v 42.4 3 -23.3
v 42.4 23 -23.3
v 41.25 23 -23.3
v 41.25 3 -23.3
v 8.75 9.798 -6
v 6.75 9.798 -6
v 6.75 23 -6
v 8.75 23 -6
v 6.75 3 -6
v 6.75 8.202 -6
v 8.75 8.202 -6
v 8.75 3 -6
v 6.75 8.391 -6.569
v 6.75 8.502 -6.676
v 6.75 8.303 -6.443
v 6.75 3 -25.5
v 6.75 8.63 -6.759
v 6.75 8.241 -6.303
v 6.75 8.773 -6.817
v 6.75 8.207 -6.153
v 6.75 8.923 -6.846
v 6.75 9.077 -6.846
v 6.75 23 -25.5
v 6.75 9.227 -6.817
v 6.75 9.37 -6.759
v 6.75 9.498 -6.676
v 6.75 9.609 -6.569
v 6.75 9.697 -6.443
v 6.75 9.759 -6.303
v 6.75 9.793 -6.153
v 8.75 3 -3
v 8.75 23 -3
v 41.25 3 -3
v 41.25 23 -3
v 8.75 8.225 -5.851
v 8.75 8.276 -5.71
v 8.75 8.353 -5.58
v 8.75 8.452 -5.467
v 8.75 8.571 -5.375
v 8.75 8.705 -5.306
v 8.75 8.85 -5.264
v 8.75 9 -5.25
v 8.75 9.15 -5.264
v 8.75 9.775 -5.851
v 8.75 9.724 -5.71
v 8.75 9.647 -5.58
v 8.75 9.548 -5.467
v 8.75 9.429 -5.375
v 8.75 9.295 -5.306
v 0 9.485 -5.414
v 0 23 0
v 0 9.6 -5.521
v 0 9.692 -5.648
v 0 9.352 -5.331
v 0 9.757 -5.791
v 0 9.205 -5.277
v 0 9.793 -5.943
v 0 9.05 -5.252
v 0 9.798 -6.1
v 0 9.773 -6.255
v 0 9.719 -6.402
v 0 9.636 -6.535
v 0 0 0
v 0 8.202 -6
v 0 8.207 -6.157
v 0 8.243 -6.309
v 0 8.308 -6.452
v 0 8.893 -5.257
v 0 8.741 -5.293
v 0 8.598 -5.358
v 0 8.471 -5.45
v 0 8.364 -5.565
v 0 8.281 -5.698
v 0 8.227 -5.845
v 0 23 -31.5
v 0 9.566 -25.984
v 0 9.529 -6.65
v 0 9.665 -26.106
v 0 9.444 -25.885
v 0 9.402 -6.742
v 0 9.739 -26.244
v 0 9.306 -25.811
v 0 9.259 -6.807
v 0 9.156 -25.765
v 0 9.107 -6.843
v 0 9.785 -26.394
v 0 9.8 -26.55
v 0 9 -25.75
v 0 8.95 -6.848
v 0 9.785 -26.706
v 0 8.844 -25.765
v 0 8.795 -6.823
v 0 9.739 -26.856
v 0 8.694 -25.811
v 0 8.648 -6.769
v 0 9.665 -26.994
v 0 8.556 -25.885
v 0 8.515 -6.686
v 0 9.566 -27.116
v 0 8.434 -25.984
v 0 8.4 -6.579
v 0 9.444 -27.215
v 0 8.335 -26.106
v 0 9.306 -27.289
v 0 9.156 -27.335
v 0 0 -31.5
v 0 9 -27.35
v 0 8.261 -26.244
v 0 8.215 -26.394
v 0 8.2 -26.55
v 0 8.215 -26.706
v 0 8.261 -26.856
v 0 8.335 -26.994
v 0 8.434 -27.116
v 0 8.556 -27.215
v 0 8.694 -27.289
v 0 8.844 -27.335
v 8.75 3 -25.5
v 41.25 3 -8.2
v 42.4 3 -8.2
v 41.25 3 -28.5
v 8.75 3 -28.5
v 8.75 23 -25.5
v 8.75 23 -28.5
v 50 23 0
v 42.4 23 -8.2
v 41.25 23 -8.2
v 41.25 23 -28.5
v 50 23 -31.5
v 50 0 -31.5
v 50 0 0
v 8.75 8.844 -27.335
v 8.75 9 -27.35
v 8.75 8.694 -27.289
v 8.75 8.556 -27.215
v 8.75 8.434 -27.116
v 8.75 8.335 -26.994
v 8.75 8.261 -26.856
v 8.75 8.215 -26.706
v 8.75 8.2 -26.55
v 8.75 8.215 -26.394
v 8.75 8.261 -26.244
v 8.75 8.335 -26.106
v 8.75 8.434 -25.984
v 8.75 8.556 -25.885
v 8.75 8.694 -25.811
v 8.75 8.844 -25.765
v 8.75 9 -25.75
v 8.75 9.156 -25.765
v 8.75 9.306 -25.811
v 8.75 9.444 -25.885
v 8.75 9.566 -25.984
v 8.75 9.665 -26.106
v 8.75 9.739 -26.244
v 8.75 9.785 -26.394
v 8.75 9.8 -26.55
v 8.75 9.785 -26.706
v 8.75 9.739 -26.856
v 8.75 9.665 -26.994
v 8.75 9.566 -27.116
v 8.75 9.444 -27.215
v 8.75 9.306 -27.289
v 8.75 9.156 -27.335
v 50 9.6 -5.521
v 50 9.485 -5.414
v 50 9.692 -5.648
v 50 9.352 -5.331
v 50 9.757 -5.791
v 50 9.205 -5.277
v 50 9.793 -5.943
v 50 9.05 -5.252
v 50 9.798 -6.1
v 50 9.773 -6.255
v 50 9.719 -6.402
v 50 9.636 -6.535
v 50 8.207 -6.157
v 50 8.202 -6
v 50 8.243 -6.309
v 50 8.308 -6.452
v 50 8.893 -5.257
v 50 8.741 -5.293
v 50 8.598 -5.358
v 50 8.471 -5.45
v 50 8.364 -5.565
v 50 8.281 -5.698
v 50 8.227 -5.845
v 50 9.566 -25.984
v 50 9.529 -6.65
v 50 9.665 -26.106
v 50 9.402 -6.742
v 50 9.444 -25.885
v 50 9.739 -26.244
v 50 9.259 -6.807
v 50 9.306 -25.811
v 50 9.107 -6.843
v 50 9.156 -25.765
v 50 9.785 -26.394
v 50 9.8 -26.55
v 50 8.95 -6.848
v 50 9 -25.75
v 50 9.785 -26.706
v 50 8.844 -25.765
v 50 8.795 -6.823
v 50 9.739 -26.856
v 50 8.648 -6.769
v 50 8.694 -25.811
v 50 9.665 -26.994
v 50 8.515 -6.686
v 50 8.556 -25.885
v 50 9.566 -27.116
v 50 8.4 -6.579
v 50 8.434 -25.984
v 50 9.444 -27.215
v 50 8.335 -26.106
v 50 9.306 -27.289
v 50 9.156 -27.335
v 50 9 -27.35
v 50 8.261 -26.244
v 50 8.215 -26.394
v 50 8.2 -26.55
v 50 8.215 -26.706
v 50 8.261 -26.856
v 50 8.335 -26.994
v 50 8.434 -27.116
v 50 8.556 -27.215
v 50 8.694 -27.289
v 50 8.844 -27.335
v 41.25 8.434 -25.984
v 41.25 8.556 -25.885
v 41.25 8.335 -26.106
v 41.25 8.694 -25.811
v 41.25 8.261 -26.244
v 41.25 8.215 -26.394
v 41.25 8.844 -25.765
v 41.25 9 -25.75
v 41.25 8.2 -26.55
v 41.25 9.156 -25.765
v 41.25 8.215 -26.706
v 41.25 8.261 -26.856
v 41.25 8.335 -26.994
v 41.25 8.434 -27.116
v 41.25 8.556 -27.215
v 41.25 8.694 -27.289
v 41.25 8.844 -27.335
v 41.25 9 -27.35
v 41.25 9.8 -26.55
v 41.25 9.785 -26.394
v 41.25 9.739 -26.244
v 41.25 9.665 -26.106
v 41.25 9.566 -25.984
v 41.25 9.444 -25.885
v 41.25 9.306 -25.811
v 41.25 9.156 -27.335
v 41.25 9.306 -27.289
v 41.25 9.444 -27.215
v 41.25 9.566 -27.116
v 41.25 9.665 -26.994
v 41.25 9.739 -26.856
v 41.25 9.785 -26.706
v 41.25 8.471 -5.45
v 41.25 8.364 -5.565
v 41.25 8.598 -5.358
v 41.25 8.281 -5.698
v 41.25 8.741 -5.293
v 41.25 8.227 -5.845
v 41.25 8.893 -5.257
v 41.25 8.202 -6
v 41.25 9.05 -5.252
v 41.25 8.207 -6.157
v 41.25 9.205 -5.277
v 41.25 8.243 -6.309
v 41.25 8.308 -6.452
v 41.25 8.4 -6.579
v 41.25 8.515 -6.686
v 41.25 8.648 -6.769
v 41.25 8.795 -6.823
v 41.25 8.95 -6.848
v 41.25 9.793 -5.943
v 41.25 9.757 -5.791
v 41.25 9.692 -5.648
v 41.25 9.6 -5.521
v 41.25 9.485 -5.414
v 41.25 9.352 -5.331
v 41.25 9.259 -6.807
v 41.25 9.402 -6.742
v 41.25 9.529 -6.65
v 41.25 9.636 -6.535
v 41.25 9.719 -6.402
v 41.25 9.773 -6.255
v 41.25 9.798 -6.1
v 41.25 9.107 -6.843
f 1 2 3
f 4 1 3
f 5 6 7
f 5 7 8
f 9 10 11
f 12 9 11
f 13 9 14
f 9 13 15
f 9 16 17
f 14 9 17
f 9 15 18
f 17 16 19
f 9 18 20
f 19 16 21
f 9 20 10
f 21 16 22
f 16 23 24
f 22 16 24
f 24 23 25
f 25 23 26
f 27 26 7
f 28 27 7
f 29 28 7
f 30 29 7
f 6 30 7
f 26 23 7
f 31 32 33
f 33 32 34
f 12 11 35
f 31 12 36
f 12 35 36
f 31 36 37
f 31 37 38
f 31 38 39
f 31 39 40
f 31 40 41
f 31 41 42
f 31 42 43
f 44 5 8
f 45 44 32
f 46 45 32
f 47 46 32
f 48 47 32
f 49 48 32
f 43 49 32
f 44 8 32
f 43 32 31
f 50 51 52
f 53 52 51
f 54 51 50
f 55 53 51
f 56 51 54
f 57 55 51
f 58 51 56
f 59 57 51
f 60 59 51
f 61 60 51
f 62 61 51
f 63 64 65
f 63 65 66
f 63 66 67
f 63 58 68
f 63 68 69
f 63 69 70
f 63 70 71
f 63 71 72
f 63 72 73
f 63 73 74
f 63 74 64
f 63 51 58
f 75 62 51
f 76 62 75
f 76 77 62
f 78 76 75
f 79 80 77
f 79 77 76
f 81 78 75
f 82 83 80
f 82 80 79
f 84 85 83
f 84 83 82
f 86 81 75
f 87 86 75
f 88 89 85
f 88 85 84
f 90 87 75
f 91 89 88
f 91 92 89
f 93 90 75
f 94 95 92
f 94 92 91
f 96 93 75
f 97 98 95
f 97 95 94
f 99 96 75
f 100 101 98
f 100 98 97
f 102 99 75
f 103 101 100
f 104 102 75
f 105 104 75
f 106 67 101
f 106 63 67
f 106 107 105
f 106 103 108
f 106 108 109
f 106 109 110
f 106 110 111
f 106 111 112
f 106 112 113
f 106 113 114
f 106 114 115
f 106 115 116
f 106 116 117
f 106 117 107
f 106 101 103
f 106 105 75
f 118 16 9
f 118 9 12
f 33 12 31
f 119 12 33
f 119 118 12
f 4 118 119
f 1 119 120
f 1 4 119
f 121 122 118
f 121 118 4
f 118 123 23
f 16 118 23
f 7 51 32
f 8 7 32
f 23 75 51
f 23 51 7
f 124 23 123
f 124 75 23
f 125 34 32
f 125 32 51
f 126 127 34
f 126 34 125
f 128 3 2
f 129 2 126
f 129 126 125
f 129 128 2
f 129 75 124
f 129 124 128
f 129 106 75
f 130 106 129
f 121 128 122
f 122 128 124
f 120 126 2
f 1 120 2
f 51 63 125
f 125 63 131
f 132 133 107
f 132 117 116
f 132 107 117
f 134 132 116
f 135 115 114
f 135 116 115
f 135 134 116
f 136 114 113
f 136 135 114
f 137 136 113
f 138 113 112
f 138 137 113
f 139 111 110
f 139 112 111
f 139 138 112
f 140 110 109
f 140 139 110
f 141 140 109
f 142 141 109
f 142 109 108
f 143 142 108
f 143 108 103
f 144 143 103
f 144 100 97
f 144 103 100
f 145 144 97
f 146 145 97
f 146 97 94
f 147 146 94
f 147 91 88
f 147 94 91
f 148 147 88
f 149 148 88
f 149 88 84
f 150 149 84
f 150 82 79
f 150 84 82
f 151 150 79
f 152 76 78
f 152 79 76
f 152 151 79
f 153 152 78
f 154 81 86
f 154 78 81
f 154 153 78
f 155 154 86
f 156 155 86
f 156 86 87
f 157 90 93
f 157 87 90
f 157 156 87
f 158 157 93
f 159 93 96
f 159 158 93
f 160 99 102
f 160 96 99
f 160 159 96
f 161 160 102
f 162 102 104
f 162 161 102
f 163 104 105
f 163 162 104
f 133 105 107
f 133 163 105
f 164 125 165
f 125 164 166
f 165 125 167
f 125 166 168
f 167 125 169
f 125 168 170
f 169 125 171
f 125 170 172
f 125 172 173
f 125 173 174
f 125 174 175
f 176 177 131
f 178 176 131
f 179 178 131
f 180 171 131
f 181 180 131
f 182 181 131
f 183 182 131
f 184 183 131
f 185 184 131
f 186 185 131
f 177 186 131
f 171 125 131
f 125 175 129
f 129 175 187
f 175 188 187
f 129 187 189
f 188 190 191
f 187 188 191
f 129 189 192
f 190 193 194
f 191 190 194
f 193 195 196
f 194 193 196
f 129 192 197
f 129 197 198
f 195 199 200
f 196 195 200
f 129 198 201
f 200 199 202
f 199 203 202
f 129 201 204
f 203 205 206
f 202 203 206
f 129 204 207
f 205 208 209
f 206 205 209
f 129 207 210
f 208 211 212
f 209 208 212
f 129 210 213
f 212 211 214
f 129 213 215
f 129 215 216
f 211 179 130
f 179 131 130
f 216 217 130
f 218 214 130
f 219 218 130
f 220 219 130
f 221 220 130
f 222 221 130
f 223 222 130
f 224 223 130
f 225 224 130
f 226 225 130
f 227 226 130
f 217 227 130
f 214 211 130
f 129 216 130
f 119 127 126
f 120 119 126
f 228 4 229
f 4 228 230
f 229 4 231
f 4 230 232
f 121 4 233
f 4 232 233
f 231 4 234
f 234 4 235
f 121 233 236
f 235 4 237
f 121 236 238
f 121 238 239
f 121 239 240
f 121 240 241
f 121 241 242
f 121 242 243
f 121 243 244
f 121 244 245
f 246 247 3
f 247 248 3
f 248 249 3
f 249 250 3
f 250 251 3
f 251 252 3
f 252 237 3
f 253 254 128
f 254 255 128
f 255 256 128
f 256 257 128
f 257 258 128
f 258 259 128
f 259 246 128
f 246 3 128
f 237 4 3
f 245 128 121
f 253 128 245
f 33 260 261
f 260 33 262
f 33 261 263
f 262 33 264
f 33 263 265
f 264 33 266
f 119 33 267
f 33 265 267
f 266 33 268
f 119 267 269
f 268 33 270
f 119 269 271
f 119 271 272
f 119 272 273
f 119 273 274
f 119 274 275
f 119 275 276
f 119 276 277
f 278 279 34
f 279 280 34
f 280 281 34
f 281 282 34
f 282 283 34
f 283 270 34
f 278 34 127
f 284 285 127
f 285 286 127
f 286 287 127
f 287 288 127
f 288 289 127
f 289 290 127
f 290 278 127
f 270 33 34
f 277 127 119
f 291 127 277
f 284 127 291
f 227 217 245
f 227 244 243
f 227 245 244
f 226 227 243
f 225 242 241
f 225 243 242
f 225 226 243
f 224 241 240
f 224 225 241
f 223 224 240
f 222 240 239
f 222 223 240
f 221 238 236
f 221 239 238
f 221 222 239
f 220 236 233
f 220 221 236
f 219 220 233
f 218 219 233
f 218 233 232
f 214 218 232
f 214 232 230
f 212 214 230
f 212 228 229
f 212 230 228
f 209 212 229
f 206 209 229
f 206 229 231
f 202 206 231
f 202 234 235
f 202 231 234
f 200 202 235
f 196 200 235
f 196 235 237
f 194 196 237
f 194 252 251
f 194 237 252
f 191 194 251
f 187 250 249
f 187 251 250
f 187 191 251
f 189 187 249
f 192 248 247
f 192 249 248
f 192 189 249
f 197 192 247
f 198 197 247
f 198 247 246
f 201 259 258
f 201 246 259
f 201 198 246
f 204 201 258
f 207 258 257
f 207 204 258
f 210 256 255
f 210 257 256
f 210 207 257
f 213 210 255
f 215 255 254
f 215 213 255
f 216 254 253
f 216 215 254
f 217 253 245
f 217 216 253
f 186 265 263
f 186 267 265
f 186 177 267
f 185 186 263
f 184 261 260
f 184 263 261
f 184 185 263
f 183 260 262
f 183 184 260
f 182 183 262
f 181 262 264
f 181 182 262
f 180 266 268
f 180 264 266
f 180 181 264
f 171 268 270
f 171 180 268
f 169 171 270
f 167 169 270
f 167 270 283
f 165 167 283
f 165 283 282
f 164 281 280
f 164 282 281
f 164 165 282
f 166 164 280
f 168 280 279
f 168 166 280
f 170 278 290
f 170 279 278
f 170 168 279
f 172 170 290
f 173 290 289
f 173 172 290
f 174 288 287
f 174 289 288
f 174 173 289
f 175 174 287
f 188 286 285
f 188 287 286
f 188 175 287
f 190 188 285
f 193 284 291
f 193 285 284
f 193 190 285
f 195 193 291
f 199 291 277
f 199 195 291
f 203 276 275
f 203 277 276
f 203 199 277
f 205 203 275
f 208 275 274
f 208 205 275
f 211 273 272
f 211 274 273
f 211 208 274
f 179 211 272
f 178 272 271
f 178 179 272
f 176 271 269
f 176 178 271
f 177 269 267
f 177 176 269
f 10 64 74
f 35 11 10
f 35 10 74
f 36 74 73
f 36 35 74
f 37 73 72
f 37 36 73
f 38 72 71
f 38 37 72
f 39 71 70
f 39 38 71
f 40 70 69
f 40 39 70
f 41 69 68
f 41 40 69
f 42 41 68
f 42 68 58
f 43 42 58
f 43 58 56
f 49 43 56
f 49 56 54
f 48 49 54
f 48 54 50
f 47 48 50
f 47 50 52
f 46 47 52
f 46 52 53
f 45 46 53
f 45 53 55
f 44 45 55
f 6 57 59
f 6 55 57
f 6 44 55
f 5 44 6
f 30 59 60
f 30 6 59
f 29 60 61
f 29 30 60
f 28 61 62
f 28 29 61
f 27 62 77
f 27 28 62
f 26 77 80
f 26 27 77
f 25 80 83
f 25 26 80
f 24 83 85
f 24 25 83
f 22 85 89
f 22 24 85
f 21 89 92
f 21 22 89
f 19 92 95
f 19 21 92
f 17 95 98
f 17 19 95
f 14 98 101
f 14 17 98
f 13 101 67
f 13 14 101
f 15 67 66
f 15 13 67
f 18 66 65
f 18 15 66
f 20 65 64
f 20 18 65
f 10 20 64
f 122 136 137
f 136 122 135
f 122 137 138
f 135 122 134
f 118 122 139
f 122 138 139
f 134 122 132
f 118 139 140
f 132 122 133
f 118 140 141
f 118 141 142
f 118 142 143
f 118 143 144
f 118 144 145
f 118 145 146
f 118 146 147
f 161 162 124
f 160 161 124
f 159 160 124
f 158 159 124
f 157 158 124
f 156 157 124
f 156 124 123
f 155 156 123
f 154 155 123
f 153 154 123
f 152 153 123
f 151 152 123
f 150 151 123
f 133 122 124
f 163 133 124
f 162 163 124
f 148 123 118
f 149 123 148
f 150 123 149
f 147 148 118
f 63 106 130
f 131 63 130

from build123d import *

# Parameters (mm, degrees)
SKETCH1_W               = 50
SKETCH1_H               = 31.5
BOSS_EXTRUDE1_DEPTH     = 23
CUT_EXTRUDE1_DEPTH      = 20
CUT_EXTRUDE2_DEPTH      = 57.769820327
CUT_EXTRUDE2_DEPTH_BACK = 57.769820327
SKETCH3_R               = 0.8


with BuildPart() as part:
    # Sketch1 → Boss-Extrude1 (new body)
    with BuildSketch(Plane(origin=(0, 0, 0), x_dir=(1, 0, 0), z_dir=(0, 1, 0))):
        with Locations((25, 15.75)):
            Rectangle(SKETCH1_W, SKETCH1_H)
    extrude(amount=BOSS_EXTRUDE1_DEPTH)

    # Sketch2 → Cut-Extrude1 (cut)
    with BuildSketch(Plane(origin=(0, 23, 0), x_dir=(1, 0, 0), z_dir=(0, 1, 0))):
        Polygon((41.25, 28.5), (8.75, 28.5), (8.75, 25.5), (6.75, 25.5), (6.75, 6), (8.75, 6), (8.75, 3), (41.25, 3), (41.25, 8.2), (42.4, 8.2), (42.4, 23.3), (41.25, 23.3), align=None)
    extrude(amount=-CUT_EXTRUDE1_DEPTH, mode=Mode.SUBTRACT)

    # Sketch3 → Cut-Extrude2 (cut, two sides: drawn at the far end of the back side and taken through both)
    with BuildSketch(Plane.ZY.offset(-41.25).offset(-CUT_EXTRUDE2_DEPTH_BACK)):
        with Locations(Location((-26.55, 9, 0), (0, 0, 180))):
            Circle(SKETCH3_R)
        with Locations(Location((-6.05, 9, 0), (0, 0, 273.583321698))):
            Circle(SKETCH3_R)
    extrude(amount=CUT_EXTRUDE2_DEPTH + CUT_EXTRUDE2_DEPTH_BACK, mode=Mode.SUBTRACT)


solid = part.part
